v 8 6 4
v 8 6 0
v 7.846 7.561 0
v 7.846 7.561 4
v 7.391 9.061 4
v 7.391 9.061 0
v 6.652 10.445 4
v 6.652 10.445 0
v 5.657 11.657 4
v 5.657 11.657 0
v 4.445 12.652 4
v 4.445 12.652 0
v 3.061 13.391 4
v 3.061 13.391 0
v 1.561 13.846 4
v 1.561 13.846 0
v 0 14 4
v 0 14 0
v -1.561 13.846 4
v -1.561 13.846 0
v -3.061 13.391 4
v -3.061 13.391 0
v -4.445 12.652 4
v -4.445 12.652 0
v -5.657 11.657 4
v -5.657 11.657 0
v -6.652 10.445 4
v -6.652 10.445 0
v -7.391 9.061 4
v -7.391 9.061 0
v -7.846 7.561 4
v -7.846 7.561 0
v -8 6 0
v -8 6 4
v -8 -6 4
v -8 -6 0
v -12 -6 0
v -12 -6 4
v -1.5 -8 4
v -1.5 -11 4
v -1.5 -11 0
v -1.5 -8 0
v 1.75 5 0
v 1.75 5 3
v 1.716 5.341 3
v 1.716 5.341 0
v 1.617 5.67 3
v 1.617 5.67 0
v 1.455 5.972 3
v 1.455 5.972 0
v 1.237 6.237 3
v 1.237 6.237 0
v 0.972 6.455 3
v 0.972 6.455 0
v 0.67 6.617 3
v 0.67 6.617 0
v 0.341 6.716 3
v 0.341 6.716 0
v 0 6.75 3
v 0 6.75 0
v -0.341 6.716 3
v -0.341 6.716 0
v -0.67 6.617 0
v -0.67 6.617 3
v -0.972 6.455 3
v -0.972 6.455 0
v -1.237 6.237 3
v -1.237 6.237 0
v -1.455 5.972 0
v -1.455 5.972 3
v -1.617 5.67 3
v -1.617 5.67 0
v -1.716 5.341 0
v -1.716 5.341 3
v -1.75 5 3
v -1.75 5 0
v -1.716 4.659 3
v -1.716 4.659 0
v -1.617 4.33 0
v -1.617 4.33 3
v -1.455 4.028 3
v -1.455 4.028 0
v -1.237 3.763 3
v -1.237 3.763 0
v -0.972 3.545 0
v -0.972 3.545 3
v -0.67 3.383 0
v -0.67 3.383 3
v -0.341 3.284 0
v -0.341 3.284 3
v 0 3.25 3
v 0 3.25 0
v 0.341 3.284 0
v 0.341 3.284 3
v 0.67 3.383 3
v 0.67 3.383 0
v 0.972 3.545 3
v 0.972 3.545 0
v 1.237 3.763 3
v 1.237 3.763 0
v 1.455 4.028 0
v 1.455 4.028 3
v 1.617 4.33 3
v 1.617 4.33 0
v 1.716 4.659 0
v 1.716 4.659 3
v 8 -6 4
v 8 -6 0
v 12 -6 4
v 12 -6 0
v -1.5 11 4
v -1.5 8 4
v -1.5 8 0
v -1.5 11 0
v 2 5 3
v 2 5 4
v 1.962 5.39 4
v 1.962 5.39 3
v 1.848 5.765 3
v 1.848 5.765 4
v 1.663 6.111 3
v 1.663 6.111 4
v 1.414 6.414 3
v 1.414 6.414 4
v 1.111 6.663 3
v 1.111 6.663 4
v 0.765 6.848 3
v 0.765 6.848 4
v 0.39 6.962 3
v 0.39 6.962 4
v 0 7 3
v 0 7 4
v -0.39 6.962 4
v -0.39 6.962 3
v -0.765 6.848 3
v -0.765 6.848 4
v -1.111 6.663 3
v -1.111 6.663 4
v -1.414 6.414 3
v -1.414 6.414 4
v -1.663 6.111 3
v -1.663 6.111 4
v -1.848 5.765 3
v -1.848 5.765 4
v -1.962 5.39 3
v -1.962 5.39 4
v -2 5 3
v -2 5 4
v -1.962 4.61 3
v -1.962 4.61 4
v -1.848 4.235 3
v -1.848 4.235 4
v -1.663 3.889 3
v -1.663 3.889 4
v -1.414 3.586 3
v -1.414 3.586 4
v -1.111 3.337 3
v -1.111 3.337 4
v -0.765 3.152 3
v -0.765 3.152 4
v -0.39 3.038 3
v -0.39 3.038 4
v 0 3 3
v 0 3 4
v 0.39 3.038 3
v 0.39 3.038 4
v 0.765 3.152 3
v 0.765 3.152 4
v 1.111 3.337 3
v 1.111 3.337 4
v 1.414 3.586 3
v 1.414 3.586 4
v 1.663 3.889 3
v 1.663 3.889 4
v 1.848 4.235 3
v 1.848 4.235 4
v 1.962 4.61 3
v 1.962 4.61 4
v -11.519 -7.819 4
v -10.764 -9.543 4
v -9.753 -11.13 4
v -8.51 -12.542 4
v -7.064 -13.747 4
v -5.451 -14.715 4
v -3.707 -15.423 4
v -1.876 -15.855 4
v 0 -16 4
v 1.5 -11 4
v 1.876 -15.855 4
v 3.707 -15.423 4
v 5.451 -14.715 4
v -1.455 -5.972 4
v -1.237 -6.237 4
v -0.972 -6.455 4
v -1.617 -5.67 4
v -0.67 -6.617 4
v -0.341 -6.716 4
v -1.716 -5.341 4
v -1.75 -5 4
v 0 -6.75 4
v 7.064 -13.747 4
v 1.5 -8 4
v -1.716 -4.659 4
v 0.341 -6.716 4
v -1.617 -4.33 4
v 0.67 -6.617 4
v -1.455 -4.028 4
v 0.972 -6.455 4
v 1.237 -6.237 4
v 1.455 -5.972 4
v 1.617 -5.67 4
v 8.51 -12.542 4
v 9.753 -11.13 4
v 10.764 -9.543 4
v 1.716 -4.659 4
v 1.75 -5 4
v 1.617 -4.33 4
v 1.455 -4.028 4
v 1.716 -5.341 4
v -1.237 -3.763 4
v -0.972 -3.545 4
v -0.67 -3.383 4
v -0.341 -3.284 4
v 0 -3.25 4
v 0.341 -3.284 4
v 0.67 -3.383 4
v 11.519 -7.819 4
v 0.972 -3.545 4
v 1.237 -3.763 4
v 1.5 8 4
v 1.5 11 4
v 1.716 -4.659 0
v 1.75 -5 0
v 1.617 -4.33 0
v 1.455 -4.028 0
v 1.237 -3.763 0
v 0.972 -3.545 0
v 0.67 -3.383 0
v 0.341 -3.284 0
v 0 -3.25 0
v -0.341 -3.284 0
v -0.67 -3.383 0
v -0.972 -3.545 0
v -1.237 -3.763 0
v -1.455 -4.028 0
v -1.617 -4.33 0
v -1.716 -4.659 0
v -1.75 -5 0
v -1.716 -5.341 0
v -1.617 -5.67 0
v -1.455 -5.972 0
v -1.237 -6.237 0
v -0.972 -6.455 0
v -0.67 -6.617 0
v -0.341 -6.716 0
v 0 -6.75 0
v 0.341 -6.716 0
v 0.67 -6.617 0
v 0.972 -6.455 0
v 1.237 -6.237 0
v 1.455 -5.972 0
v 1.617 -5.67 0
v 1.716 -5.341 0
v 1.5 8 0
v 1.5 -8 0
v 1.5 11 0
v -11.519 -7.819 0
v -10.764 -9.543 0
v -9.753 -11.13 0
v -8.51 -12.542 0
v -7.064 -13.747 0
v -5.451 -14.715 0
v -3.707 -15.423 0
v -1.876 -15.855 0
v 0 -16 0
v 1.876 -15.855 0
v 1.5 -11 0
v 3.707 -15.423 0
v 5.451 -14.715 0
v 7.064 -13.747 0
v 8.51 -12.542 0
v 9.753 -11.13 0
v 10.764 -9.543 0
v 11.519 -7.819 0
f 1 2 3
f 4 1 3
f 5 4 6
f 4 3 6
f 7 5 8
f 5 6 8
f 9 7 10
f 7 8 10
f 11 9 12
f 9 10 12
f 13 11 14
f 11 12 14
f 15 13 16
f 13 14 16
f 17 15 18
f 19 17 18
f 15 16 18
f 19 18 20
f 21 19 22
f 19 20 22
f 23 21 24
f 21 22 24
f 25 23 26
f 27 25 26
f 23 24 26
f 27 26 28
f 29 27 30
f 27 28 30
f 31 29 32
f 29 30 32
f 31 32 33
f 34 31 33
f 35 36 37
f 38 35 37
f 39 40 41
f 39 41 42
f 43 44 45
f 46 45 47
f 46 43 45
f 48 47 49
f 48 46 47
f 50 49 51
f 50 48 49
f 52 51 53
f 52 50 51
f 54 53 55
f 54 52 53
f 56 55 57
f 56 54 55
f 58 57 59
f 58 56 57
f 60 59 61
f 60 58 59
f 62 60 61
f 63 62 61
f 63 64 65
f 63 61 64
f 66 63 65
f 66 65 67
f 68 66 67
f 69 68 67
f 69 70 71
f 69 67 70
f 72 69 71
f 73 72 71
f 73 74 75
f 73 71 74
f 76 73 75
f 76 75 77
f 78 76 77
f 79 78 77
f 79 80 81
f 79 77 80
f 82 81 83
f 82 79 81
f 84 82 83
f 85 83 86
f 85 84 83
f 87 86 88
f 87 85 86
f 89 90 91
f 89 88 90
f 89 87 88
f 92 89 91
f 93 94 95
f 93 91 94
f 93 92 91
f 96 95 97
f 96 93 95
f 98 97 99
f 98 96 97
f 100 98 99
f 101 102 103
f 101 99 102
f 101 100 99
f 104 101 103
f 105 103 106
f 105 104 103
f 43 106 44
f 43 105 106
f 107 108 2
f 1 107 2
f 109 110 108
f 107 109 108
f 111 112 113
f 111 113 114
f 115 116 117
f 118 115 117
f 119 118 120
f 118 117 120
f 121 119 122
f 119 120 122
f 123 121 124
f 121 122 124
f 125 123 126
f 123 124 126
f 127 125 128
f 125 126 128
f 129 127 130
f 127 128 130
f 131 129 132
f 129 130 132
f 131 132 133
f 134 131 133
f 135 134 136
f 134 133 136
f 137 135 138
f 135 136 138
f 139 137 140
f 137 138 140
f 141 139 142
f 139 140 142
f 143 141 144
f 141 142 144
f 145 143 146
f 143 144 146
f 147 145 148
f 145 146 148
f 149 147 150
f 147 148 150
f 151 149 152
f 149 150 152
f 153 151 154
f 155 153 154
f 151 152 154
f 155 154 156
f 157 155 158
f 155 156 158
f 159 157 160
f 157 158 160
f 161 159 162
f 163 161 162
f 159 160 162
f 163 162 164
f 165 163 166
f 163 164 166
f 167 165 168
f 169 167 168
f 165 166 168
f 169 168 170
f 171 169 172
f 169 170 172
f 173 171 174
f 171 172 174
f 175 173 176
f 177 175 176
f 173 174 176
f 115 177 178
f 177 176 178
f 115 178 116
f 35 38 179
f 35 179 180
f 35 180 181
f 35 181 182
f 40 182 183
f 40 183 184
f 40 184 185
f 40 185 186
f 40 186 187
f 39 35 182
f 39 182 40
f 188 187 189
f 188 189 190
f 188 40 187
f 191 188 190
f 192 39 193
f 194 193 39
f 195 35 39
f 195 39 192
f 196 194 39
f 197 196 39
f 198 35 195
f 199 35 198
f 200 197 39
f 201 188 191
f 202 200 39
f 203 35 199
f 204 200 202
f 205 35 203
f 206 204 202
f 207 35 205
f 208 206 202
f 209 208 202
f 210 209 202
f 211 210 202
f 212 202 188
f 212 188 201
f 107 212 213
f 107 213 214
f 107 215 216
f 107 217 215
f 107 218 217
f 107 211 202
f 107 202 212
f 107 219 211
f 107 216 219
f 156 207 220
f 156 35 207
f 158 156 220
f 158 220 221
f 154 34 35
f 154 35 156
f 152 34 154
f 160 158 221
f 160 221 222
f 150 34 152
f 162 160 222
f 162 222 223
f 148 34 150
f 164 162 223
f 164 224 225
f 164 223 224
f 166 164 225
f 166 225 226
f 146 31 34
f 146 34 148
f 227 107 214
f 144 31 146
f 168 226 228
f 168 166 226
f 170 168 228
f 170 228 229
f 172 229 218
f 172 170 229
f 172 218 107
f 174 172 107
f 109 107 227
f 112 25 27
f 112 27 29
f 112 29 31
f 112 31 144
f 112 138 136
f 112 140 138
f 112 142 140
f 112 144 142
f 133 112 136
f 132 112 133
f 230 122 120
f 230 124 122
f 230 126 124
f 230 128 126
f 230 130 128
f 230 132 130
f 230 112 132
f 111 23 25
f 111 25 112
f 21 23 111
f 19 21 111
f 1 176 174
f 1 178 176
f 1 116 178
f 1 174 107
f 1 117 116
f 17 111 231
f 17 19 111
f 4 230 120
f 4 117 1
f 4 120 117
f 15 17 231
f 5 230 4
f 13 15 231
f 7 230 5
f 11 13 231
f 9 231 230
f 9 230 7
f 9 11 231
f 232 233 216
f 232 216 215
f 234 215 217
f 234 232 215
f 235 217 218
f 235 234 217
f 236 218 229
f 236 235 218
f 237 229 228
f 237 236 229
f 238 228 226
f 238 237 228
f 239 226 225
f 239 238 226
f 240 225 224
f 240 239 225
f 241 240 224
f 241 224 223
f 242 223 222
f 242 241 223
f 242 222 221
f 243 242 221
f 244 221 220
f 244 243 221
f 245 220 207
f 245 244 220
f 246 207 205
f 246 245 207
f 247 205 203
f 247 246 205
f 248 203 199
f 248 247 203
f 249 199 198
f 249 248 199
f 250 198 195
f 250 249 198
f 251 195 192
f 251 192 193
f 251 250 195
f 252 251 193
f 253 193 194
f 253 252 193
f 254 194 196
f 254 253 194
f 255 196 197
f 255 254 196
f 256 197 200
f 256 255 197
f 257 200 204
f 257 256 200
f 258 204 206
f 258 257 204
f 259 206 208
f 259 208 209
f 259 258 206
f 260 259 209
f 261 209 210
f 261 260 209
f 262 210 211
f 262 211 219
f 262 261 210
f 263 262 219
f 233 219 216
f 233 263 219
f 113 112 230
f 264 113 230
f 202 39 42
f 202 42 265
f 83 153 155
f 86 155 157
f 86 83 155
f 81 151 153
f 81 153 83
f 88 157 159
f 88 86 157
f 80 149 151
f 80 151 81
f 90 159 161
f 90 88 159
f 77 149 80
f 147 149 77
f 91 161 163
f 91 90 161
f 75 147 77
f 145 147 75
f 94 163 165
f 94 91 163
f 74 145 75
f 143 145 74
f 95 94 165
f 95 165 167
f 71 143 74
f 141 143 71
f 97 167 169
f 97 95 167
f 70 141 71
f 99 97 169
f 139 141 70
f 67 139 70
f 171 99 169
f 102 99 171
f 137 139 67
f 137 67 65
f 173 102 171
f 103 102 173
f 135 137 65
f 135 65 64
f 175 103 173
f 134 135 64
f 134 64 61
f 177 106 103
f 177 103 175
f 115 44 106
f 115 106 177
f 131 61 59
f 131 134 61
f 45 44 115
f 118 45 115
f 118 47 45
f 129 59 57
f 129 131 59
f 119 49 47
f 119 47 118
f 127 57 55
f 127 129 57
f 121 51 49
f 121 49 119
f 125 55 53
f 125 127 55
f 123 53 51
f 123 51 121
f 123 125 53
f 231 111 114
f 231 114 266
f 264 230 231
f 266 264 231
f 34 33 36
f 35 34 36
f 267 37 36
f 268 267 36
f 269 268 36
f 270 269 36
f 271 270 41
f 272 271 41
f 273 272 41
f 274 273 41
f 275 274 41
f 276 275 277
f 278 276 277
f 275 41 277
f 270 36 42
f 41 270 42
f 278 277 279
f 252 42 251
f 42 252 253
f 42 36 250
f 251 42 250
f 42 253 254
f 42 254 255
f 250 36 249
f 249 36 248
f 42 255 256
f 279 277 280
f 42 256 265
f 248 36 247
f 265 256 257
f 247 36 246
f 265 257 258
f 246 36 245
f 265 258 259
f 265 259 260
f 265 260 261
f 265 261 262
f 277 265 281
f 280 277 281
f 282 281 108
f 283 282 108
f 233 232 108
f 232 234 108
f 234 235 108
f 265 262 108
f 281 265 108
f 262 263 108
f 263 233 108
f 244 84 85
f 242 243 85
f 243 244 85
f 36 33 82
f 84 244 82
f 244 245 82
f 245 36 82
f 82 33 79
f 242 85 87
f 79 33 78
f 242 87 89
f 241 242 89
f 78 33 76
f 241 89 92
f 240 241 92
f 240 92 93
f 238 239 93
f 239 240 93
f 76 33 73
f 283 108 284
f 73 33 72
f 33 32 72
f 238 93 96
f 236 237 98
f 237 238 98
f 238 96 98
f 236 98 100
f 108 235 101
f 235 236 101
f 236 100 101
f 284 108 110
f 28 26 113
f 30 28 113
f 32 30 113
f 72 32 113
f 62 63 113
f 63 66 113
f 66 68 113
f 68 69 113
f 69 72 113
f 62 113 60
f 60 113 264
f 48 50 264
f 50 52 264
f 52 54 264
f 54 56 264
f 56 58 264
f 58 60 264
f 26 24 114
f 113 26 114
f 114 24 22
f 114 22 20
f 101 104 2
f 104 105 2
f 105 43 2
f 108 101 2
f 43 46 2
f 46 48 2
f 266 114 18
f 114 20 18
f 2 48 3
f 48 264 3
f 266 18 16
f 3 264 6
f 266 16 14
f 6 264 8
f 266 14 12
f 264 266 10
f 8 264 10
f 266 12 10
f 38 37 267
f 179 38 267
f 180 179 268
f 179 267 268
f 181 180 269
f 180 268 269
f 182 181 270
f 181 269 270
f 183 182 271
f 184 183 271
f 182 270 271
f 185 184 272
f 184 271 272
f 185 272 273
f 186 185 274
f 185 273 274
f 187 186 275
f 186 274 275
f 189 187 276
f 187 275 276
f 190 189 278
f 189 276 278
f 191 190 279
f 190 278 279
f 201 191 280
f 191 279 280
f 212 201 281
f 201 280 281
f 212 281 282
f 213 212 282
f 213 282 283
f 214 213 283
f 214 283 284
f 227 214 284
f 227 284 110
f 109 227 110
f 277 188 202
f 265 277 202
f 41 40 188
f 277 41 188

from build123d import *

# Parameters (mm, degrees)
SKETCH1_R           = 1.75
BOSS_EXTRUDE1_DEPTH = 4
SKETCH2_W           = 3
SKETCH2_H           = 3
CUT_EXTRUDE1_DEPTH  = 21.396078054
SKETCH3_R           = 2
CUT_EXTRUDE2_DEPTH  = 1


with BuildPart() as part:
    # Sketch1 → Boss-Extrude1 (new body)
    with BuildSketch(Plane.XY):
        with BuildLine():
            Line((-8, 6), (-8, -6))
            Line((-8, -6), (-12, -6))
            ThreePointArc((-12, -6), (0, -16), (12, -6))
            Line((12, -6), (8, -6))
            Line((8, -6), (8, 6))
            ThreePointArc((8, 6), (0, 14), (-8, 6))
        make_face()
        with Locations((0, 5)):
            Circle(SKETCH1_R, mode=Mode.SUBTRACT)
        with Locations((0, -5)):
            Circle(SKETCH1_R, mode=Mode.SUBTRACT)
    extrude(amount=BOSS_EXTRUDE1_DEPTH)

    # Sketch2 → Cut-Extrude1 (cut, through all)
    with BuildSketch(Plane.XY.offset(4)):
        with Locations((0, 9.5)):
            Rectangle(SKETCH2_W, SKETCH2_H)
        with Locations((0, -9.5)):
            Rectangle(SKETCH2_W, SKETCH2_H)
    extrude(amount=-CUT_EXTRUDE1_DEPTH, mode=Mode.SUBTRACT)

    # Sketch3 → Cut-Extrude2 (cut)
    with BuildSketch(Plane.XY.offset(4)):
        with Locations((0, 5)):
            Circle(SKETCH3_R)
    extrude(amount=-CUT_EXTRUDE2_DEPTH, mode=Mode.SUBTRACT)


solid = part.part
